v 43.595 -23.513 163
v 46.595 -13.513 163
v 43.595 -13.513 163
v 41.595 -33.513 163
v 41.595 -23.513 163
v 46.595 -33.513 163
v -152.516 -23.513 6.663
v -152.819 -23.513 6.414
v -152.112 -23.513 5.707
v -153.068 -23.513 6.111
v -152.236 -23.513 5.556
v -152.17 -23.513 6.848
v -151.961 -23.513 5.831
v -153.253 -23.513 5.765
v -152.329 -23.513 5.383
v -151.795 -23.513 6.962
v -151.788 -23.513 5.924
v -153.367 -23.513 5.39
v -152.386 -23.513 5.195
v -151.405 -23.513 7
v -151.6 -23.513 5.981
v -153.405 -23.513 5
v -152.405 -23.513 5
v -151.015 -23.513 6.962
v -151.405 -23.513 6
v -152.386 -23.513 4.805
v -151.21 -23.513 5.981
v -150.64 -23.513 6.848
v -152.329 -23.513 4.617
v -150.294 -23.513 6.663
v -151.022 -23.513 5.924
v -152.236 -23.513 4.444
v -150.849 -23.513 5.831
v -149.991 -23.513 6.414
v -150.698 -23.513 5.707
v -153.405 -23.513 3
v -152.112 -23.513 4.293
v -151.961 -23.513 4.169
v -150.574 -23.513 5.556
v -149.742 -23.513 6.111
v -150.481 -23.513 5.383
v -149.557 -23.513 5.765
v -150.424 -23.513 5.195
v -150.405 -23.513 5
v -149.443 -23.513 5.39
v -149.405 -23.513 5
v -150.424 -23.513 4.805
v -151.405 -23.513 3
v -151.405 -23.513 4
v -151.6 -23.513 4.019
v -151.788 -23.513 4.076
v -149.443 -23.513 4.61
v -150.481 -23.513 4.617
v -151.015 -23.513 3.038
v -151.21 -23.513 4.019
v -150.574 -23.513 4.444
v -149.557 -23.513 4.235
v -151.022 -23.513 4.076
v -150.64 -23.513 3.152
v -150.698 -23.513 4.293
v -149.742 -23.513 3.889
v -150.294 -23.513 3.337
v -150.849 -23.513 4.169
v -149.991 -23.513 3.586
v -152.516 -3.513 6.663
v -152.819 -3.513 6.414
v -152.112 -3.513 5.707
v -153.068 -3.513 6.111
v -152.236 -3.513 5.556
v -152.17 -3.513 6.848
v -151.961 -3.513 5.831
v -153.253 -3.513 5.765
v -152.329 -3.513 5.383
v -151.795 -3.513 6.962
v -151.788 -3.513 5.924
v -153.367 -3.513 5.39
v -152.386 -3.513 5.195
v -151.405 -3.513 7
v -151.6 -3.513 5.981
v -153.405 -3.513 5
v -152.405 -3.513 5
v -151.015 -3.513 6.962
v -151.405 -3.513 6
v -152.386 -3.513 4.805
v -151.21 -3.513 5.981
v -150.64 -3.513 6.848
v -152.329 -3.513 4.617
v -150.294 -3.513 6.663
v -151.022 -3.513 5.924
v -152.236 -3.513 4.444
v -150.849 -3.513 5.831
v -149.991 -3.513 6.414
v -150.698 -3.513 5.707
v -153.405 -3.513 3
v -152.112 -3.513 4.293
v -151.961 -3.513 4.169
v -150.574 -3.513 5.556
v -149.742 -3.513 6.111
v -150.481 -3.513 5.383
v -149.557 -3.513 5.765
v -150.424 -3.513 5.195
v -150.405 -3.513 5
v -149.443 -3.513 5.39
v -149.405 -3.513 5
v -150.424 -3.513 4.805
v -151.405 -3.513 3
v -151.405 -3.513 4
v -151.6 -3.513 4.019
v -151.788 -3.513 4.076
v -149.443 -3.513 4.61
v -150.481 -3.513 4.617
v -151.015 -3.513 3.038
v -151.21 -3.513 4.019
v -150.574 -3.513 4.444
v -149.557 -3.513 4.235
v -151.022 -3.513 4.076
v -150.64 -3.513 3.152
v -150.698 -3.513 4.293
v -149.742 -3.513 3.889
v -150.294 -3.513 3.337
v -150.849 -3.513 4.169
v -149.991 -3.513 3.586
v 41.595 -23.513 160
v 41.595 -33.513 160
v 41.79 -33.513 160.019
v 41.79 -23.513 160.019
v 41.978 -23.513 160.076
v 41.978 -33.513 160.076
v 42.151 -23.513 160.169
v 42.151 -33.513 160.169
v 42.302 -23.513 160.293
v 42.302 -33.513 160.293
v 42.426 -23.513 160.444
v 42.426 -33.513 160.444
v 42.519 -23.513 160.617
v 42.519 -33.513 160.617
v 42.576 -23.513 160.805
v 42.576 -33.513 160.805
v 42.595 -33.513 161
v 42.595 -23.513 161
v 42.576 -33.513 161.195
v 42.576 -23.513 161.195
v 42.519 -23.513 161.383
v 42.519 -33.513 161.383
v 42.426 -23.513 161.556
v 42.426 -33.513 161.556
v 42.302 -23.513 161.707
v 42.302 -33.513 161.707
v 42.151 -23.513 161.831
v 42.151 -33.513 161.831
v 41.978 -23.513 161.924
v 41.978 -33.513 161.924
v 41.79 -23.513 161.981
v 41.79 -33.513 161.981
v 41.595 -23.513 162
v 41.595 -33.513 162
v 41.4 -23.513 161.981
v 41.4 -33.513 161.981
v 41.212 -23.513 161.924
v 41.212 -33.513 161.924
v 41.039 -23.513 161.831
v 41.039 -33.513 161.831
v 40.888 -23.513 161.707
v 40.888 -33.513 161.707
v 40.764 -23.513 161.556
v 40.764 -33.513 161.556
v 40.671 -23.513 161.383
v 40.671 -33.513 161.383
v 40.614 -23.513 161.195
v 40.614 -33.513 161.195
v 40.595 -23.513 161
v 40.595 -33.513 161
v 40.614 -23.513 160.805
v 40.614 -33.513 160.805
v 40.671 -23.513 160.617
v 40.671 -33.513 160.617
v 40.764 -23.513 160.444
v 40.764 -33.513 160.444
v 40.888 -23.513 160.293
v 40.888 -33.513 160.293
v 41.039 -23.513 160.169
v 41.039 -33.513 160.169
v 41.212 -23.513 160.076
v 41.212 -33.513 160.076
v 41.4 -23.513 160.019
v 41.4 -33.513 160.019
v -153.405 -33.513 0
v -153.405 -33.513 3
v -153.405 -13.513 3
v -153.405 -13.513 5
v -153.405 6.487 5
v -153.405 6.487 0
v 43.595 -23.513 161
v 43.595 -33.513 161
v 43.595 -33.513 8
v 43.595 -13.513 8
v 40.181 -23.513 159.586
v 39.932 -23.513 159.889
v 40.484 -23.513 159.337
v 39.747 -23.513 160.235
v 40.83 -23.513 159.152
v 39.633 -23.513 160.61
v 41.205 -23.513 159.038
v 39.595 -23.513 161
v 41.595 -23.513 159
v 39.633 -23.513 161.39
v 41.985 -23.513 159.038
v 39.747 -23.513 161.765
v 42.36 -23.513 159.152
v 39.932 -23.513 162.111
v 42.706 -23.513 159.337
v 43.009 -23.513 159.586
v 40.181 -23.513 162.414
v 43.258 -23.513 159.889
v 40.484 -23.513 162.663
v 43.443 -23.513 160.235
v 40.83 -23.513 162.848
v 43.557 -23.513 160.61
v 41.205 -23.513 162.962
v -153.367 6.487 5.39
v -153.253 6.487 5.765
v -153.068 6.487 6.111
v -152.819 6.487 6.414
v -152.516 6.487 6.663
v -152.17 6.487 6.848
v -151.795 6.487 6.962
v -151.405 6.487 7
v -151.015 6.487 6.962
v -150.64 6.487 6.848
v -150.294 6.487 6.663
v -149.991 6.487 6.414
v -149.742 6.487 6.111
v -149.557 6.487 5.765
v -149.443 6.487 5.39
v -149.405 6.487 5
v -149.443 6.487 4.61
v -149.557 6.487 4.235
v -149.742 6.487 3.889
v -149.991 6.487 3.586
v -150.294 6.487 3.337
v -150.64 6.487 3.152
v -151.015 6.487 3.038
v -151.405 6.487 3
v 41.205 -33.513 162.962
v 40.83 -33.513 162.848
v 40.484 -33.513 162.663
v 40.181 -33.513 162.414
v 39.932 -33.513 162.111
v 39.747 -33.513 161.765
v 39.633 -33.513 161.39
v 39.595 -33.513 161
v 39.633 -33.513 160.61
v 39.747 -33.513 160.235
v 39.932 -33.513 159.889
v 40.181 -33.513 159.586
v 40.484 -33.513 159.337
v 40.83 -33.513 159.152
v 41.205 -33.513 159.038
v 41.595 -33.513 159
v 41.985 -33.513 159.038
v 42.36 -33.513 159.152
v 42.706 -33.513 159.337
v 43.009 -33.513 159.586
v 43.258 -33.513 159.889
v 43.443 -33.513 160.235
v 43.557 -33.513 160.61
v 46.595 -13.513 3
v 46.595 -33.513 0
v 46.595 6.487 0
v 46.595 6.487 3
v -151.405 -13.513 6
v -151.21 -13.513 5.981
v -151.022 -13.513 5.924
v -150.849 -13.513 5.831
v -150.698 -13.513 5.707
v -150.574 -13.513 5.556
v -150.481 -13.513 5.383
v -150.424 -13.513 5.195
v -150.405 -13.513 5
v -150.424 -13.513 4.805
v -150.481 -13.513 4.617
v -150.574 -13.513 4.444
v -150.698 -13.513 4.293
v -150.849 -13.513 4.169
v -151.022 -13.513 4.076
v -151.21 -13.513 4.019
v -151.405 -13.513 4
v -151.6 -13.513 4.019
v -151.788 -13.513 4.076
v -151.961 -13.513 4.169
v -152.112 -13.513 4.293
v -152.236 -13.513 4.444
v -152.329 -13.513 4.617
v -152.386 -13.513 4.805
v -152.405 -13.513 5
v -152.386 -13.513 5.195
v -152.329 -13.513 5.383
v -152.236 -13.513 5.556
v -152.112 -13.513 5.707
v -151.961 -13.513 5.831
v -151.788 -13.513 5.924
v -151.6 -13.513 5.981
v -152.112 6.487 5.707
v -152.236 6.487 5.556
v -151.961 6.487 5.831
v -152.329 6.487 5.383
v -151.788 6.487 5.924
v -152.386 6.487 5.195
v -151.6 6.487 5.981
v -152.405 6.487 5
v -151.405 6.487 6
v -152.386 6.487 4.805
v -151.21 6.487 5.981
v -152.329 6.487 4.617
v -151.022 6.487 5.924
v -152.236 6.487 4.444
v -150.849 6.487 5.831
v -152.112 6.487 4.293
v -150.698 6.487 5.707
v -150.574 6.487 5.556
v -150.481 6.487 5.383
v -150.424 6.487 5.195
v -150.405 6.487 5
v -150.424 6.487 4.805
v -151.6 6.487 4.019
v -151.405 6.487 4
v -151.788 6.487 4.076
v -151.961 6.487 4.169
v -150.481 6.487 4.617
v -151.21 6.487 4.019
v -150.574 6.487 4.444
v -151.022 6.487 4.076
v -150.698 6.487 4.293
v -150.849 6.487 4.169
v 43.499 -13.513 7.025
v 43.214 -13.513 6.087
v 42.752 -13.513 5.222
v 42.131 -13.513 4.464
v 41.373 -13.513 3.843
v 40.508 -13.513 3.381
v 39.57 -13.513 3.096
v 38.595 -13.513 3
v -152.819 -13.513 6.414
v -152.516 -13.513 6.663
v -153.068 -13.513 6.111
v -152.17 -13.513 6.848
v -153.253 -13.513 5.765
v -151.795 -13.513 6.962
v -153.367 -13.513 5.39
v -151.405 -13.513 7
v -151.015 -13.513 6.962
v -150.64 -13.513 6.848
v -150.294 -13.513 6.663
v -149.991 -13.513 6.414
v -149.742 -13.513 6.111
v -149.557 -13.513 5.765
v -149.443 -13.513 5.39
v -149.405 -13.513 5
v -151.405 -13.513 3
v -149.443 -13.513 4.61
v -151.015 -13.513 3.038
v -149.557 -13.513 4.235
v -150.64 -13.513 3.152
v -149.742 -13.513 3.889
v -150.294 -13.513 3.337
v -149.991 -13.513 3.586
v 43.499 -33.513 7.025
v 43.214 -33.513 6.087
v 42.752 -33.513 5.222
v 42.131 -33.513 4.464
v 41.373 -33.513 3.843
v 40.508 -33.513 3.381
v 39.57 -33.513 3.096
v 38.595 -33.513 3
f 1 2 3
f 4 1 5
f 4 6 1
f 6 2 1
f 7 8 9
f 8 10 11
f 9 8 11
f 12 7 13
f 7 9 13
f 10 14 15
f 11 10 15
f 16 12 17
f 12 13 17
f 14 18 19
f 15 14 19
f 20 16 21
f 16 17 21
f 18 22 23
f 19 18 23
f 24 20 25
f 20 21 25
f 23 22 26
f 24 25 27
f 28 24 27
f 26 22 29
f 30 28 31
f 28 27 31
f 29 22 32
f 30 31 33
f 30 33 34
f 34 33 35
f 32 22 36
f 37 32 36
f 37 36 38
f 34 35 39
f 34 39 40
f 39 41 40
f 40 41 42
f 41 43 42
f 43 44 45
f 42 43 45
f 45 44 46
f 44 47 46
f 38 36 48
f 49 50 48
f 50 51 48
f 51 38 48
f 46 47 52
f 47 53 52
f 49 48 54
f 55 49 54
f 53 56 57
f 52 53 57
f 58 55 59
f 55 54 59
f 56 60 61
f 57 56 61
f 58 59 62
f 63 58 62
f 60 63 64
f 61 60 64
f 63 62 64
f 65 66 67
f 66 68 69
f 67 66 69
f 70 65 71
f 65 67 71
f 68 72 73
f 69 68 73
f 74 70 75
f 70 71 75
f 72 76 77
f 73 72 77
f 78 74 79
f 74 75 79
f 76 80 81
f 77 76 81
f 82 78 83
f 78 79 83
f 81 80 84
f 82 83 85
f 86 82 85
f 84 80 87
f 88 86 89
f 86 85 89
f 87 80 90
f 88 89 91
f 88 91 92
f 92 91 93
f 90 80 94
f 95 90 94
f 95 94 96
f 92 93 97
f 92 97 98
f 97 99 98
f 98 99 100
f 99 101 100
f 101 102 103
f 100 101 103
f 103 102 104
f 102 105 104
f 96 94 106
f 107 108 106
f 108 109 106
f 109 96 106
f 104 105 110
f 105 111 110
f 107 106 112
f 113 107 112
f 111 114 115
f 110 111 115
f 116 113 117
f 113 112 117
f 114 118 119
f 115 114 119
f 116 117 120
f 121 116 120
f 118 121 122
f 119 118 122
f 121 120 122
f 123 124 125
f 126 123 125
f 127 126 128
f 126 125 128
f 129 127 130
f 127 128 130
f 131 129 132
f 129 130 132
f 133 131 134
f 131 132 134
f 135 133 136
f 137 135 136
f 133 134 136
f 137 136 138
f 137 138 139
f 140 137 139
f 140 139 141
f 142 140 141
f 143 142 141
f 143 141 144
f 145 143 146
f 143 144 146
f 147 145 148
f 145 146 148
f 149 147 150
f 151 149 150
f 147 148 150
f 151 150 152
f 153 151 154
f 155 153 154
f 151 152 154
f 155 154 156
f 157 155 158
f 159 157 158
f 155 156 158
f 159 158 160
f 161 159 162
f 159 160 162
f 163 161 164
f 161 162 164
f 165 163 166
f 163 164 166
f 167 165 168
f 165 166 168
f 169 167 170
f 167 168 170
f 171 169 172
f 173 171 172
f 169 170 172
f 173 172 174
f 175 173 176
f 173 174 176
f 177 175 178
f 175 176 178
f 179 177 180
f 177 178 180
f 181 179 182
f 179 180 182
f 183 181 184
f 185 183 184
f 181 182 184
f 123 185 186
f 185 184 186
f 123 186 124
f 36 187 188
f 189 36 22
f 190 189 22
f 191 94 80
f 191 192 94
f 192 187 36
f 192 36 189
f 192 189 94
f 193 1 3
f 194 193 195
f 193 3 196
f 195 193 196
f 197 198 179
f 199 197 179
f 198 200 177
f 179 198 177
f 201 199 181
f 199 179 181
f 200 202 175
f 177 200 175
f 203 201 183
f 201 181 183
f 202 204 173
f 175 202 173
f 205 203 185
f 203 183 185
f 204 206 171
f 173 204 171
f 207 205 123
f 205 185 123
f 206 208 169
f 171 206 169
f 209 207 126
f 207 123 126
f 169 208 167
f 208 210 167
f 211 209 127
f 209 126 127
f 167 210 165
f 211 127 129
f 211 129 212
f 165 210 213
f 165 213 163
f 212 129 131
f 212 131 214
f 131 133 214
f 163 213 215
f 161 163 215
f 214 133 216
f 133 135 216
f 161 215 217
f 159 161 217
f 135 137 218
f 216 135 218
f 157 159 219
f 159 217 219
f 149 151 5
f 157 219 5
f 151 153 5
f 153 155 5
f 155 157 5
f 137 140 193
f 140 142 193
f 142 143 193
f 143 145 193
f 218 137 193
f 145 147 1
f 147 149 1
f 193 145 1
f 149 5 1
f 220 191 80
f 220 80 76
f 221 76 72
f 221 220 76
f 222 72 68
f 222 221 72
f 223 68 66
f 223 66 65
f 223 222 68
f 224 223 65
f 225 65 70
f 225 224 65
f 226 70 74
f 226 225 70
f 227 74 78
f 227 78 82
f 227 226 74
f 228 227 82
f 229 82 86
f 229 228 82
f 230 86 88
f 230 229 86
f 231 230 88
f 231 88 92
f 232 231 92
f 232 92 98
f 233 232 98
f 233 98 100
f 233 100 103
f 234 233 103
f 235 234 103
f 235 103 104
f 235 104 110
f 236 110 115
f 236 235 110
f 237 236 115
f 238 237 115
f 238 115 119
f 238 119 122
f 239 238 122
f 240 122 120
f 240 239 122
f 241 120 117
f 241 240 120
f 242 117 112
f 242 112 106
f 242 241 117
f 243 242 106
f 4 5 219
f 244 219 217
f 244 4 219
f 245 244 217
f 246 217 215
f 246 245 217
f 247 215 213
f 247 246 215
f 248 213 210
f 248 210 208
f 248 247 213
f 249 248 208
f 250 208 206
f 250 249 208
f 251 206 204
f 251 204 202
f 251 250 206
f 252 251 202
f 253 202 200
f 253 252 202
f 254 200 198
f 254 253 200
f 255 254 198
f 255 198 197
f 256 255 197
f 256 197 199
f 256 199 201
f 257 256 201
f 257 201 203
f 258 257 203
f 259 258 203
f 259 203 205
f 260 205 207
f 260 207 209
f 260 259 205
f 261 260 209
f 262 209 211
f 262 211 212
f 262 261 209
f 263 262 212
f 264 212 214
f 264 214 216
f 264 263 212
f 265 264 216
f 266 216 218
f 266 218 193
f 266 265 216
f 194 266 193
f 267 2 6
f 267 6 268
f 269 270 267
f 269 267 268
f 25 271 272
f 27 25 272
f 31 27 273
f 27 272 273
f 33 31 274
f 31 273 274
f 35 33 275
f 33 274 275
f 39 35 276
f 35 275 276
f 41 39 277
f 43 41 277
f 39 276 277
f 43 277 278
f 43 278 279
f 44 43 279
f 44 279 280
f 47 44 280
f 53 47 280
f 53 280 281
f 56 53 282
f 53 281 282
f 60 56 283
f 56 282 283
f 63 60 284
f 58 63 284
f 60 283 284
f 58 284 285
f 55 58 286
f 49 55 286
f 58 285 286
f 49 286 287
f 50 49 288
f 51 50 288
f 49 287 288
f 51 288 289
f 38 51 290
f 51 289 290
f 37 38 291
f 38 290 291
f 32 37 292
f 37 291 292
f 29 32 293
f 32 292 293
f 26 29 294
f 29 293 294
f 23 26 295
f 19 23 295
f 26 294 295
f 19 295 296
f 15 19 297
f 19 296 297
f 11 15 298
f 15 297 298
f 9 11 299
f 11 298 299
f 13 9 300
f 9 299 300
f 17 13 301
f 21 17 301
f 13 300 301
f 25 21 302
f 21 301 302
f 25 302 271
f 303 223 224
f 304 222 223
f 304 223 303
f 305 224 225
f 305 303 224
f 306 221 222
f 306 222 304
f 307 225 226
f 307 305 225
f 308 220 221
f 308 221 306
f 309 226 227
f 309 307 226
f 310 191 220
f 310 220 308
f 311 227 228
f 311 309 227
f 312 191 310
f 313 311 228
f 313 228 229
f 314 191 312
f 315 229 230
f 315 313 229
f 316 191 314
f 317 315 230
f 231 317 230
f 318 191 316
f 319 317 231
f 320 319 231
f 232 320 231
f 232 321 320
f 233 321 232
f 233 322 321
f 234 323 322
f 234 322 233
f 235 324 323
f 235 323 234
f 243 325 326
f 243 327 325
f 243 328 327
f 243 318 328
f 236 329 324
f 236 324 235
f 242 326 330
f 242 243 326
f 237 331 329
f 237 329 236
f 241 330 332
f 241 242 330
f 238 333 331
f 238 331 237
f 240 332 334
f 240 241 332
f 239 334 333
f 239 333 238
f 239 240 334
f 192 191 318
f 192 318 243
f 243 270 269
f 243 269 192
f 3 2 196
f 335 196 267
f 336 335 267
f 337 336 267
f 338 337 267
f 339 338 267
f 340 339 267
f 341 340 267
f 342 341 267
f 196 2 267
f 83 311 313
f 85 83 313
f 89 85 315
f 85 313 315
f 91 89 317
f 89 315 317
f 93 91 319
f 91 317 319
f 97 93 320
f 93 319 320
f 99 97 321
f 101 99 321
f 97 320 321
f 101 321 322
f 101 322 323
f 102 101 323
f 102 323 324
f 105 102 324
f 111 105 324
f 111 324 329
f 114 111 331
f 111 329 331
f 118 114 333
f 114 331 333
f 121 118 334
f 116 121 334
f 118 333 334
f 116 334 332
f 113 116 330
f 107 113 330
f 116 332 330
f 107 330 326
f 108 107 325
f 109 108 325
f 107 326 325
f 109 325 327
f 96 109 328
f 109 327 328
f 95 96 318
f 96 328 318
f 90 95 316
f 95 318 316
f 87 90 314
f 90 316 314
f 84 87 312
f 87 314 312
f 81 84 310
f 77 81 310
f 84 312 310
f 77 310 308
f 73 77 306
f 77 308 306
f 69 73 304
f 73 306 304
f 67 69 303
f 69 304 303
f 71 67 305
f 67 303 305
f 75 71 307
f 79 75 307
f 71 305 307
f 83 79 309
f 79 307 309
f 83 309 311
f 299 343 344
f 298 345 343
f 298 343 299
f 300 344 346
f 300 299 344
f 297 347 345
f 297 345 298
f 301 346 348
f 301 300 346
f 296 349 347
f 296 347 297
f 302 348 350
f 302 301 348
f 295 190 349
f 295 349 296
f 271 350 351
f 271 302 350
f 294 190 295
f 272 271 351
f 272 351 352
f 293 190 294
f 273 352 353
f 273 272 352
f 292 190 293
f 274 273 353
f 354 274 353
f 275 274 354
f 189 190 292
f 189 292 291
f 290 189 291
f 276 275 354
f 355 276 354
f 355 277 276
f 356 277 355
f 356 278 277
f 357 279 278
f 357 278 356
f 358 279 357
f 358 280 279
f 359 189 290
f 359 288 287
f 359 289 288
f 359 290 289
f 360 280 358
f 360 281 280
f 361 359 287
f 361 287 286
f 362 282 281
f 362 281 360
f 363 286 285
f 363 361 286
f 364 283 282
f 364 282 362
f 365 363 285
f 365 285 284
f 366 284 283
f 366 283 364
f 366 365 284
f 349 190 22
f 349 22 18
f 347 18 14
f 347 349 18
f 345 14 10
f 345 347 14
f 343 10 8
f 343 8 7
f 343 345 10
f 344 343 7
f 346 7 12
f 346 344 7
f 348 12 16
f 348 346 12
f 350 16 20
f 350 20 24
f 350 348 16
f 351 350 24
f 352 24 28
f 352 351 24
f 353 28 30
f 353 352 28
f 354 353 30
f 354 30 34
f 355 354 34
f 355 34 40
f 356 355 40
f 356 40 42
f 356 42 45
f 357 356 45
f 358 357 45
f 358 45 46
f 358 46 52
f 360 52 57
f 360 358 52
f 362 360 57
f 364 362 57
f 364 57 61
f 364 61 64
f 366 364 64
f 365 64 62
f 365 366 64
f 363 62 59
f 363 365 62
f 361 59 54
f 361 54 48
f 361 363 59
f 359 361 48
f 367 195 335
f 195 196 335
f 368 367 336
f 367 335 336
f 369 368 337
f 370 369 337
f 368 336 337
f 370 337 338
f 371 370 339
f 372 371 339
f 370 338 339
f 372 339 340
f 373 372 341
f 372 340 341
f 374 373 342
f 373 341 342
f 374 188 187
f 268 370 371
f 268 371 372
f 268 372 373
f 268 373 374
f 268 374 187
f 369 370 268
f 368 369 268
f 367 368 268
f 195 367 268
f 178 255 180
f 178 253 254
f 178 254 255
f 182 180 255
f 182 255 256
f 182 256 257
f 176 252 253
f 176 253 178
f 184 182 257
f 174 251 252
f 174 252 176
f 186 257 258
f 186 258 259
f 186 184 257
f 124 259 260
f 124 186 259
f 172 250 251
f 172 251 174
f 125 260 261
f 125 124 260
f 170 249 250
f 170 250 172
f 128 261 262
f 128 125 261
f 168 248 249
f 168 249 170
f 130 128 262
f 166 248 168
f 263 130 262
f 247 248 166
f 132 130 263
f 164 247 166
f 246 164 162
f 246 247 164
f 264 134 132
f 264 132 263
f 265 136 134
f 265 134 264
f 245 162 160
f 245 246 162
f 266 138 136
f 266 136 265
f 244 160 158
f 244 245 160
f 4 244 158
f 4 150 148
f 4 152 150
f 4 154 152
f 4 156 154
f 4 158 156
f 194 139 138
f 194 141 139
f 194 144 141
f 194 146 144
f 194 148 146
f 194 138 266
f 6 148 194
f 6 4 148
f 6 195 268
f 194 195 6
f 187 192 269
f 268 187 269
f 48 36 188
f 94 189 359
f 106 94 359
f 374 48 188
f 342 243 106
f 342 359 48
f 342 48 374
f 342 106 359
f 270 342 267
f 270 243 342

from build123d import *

# Parameters (mm, degrees)
SKETCH1_W           = 200
SKETCH1_H           = 40
BOSS_EXTRUDE1_DEPTH = 3
SKETCH2_W           = 160
SKETCH2_H           = 20
BOSS_EXTRUDE2_DEPTH = 3
FILLET1_R           = 5
SKETCH3_R           = 1
BOSS_EXTRUDE3_DEPTH = 10
LPATTERN1_COUNT     = 2
LPATTERN1_PITCH     = 20
SKETCH4_R           = 1
BOSS_EXTRUDE4_DEPTH = 10


with BuildPart() as part:
    # Sketch1 → Boss-Extrude1 (new body)
    with BuildSketch(Plane.XY):
        with Locations((-53.405017921, -13.512544803)):
            Rectangle(SKETCH1_W, SKETCH1_H)
    extrude(amount=BOSS_EXTRUDE1_DEPTH)

    # Sketch2 → Boss-Extrude2 (add)
    with BuildSketch(Plane(origin=(46.594982079, 0, 0), x_dir=(0, 0, -1), z_dir=(1, 0, 0))):
        with Locations((-83, -23.512544803)):
            Rectangle(SKETCH2_W, SKETCH2_H)
    extrude(amount=-BOSS_EXTRUDE2_DEPTH)

    # Fillet1
    fillet1_edges = [part.edges().sort_by_distance(p)[0] for p in [
        (43.594982079, -23.512544803, 3),
    ]]
    fillet(fillet1_edges, radius=FILLET1_R)

    # Sketch3 → Boss-Extrude3 (add)
    with BuildSketch(Plane(origin=(0, 6.487455197, 0), x_dir=(1, 0, 0), z_dir=(0, 1, 0))):
        with BuildLine():
            Line((-153.405017921, -3), (-153.405017921, -5))
            ThreePointArc((-153.405017921, -5), (-149.990804359, -6.414213562), (-151.405017921, -3))
            Line((-151.405017921, -3), (-153.405017921, -3))
        make_face()
        with Locations(Location((-151.405017921, -5, 0), (0, 0, 270))):
            Circle(SKETCH3_R, mode=Mode.SUBTRACT)
    boss_extrude3 = extrude(amount=-BOSS_EXTRUDE3_DEPTH)

    # LPattern1: Boss-Extrude3 ×2
    with Locations(*[(0, -i * LPATTERN1_PITCH, 0) for i in range(1, LPATTERN1_COUNT)]):
        add(boss_extrude3)

    # Sketch4 → Boss-Extrude4 (add)
    with BuildSketch(Plane.XZ.offset(33.512544803)):
        with BuildLine():
            Line((43.594982079, 163), (41.594982079, 163))
            ThreePointArc((41.594982079, 163), (40.180768516, 159.585786438), (43.594982079, 161))
            Line((43.594982079, 161), (43.594982079, 163))
        make_face()
        with Locations(Location((41.594982079, 161, 0), (0, 0, 270))):
            Circle(SKETCH4_R, mode=Mode.SUBTRACT)
    extrude(amount=-BOSS_EXTRUDE4_DEPTH)


solid = part.part
